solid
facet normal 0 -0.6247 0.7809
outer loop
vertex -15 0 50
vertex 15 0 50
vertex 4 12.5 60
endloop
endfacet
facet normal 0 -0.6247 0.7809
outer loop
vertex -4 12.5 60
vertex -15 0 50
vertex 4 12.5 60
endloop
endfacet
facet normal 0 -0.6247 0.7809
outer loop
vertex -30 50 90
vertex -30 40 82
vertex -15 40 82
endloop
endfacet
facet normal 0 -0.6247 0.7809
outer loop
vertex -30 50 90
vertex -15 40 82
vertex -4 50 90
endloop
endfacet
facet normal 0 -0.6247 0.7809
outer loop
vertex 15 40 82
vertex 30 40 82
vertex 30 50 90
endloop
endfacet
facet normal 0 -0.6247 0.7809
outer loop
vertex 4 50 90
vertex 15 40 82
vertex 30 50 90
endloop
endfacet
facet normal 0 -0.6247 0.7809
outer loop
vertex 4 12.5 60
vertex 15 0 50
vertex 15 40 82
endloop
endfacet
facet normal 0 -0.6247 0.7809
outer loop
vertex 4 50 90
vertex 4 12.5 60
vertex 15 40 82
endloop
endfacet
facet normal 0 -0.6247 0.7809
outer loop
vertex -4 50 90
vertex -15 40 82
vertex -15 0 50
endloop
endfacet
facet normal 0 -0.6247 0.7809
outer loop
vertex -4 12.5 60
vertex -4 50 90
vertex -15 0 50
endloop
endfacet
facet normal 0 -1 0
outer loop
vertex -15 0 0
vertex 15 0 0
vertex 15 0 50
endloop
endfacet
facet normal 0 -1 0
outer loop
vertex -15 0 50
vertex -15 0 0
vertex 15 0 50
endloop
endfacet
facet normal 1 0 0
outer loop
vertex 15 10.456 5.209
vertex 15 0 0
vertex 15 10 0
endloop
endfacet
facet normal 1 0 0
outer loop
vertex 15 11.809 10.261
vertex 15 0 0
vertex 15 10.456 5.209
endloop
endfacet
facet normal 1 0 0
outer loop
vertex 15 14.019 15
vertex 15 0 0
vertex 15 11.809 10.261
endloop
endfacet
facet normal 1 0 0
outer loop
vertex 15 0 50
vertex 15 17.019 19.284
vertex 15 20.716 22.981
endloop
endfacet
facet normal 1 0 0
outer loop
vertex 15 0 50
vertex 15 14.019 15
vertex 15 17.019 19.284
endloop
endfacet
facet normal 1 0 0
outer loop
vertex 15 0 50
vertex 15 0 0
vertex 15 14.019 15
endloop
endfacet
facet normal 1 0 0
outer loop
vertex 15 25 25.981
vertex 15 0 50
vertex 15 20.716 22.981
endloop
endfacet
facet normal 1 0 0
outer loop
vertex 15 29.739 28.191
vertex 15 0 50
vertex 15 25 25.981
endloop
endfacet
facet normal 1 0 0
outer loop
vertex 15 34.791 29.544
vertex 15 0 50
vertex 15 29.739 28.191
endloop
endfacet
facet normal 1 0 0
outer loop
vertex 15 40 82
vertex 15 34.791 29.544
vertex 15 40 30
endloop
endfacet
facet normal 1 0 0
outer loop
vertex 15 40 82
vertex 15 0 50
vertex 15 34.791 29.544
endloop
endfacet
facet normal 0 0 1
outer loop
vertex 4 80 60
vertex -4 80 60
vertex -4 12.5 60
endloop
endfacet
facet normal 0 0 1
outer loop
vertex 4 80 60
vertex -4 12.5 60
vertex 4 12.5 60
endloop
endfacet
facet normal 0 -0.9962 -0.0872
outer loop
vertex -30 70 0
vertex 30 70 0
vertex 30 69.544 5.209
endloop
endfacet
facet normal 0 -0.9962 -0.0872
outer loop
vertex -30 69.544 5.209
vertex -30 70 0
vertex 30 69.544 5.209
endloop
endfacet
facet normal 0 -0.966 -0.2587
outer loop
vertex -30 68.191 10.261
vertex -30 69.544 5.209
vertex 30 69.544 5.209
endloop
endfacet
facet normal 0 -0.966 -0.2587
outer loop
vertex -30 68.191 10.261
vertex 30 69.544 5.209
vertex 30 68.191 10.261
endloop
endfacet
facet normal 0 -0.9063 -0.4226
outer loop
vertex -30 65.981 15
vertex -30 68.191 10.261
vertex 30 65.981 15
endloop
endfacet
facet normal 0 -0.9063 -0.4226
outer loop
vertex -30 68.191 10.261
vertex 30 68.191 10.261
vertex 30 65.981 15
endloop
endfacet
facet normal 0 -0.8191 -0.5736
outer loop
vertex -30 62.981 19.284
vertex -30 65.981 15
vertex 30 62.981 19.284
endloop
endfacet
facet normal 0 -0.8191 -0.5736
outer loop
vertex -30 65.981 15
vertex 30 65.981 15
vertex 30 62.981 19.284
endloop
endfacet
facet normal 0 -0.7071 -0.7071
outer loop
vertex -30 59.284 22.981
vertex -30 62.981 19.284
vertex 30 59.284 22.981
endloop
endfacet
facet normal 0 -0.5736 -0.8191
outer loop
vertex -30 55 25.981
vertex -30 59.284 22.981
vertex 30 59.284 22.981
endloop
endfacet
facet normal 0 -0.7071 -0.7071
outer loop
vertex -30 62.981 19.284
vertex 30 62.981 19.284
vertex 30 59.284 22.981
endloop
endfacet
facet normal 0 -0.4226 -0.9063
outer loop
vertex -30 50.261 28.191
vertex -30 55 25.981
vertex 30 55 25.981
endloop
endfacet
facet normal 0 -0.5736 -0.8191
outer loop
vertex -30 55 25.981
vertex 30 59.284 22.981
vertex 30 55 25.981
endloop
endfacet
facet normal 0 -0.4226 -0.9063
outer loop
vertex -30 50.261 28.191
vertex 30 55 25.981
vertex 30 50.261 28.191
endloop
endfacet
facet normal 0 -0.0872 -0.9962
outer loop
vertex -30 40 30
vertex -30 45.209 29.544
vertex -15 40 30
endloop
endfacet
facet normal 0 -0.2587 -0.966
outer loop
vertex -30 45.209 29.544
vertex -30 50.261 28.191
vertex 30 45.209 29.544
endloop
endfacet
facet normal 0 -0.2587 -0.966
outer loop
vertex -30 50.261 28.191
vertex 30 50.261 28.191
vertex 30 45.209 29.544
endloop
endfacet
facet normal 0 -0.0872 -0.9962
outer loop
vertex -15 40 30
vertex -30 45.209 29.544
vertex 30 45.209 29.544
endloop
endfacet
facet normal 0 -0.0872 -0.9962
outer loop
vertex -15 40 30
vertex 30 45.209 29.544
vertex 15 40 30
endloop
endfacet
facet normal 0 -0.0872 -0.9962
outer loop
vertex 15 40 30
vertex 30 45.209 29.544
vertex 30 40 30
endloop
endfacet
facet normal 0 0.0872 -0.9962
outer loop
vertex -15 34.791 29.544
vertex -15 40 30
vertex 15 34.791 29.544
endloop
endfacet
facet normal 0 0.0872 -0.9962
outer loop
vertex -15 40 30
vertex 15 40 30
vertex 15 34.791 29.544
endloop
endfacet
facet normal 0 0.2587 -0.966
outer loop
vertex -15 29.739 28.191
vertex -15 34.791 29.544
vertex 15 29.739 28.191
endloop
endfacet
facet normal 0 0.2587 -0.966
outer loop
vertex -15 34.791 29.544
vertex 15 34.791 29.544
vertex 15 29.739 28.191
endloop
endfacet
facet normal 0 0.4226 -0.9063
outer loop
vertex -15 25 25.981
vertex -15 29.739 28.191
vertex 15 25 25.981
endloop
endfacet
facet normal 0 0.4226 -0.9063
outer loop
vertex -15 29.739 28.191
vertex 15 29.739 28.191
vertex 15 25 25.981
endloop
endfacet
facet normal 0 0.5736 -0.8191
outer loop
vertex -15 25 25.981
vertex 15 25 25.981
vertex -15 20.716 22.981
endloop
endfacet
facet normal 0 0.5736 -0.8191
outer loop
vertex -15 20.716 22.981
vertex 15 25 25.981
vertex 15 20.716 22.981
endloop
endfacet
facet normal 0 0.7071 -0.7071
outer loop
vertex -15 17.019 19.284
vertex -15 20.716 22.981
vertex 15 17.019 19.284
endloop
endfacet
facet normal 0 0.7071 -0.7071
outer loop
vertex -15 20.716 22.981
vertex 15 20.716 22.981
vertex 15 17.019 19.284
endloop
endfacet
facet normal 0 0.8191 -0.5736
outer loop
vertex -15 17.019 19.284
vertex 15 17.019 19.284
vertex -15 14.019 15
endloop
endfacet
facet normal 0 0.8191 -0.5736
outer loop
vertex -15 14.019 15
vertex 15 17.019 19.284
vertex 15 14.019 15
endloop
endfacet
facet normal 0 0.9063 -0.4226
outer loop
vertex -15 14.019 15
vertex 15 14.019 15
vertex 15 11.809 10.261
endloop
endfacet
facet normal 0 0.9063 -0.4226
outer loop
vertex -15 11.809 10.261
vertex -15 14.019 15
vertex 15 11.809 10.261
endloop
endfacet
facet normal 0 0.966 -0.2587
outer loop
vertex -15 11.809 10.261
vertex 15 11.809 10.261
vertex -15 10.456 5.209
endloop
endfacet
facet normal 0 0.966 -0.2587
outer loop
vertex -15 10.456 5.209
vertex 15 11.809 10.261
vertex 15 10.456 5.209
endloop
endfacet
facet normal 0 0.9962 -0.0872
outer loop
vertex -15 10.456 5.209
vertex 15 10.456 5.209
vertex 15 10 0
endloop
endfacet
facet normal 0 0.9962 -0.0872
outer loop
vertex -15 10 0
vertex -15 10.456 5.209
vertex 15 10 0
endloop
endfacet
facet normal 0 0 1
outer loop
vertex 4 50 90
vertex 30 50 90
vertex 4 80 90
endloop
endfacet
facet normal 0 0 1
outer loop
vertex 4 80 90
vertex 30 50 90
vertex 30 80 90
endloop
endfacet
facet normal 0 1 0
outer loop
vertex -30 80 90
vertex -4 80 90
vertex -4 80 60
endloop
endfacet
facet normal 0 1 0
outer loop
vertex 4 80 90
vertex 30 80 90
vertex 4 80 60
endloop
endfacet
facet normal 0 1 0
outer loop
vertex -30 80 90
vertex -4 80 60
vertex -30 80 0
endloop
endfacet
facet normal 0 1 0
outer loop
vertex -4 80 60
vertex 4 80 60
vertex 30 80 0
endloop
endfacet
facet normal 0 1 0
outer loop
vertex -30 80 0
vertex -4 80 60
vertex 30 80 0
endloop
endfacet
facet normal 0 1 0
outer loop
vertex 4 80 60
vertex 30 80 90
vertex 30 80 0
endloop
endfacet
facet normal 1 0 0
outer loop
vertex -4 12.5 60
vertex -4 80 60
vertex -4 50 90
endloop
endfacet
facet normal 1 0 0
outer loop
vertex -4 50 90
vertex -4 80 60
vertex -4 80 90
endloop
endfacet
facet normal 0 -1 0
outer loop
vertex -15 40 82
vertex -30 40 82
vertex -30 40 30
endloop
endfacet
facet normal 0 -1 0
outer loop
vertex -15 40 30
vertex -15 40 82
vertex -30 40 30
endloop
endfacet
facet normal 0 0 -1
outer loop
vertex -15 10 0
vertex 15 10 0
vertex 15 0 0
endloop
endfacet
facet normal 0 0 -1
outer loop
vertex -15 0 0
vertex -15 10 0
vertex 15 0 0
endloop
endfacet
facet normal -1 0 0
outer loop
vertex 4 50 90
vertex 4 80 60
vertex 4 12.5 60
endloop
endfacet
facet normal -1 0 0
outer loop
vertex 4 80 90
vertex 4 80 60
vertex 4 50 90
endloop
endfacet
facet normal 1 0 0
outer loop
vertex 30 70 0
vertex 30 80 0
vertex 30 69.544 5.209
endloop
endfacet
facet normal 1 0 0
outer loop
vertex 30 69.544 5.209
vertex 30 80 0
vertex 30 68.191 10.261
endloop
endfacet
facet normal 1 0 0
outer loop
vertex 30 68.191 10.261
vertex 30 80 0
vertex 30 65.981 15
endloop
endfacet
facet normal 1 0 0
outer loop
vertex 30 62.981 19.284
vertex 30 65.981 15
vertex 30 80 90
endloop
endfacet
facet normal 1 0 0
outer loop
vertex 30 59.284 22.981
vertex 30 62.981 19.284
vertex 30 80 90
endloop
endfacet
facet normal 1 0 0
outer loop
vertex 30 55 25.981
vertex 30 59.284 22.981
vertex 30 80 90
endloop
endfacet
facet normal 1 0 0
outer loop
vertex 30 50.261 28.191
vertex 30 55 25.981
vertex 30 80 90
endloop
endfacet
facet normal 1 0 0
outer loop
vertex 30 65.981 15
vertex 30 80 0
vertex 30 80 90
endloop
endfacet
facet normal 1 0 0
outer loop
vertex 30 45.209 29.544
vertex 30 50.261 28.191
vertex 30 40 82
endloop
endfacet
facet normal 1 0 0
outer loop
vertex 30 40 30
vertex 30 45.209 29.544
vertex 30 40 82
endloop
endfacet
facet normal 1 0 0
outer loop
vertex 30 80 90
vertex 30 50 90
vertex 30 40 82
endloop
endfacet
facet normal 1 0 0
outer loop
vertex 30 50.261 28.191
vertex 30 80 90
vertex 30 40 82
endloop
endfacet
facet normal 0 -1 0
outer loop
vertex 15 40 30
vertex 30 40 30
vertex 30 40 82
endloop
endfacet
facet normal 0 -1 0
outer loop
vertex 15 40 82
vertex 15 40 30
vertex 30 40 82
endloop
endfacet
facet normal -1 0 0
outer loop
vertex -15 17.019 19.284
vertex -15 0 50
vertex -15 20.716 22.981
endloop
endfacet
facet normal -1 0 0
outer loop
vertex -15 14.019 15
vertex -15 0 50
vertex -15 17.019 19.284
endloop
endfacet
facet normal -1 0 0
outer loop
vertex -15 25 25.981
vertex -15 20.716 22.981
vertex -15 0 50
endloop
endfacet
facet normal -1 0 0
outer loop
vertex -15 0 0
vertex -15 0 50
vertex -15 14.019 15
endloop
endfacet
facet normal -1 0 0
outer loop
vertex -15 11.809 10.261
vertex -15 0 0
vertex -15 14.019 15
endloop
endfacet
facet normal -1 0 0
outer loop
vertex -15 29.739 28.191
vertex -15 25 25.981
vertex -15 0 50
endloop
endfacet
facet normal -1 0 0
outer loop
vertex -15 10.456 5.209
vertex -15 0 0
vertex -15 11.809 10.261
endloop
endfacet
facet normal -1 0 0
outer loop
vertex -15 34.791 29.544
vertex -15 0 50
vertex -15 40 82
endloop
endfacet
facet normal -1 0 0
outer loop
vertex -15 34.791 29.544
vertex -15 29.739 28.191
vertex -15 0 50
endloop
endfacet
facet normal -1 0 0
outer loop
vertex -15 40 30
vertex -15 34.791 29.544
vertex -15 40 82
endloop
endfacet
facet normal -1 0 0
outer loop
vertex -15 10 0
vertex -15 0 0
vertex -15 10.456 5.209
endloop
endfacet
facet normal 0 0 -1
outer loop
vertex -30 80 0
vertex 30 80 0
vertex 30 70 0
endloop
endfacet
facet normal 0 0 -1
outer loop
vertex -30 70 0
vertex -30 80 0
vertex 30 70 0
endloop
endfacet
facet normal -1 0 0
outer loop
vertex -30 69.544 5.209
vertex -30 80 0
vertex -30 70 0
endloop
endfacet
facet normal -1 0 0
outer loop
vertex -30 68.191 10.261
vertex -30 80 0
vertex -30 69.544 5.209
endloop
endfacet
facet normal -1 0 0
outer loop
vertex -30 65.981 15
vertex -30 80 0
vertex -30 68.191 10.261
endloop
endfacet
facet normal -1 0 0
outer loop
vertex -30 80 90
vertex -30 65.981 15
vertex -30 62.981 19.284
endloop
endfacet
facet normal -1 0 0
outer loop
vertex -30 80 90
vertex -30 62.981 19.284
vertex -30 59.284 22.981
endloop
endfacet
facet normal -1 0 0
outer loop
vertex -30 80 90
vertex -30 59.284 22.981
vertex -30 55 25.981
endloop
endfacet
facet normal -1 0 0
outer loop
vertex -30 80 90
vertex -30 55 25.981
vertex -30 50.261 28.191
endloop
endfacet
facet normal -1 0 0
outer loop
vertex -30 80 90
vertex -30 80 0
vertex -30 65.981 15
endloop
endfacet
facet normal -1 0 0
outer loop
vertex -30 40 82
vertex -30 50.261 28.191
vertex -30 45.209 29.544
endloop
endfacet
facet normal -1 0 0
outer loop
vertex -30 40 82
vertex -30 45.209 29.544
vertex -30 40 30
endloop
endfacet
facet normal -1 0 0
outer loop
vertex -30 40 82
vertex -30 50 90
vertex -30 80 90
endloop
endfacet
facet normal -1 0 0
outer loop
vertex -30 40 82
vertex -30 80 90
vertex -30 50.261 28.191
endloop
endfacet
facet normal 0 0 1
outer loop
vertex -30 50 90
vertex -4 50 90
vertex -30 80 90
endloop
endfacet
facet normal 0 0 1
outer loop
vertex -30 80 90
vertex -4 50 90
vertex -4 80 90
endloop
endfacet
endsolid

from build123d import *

# Parameters (mm, degrees)
PAD_DEPTH       = 30
SKETCH002_W     = 40
SKETCH002_H     = 90
POCKET_DEPTH    = 15
SKETCH003_W     = 40
SKETCH003_H     = 90
POCKET001_DEPTH = 15
SKETCH004_W     = 30
SKETCH004_H     = 8
POCKET002_DEPTH = 80.001


with BuildPart() as part:
    # Sketch → Pad (new body, symmetric)
    with BuildSketch(Plane.YZ):
        with BuildLine():
            ThreePointArc((70, 0), (40, 30), (10, 0))
            Line((10, 0), (0, 0))
            Line((0, 0), (0, 50))
            Line((0, 50), (50, 90))
            Line((50, 90), (80, 90))
            Line((80, 90), (80, 0))
            Line((80, 0), (70, 0))
        make_face()
    extrude(amount=PAD_DEPTH, both=True)

    # Sketch002 (on Face9 of Pad) → Pocket (cut)
    with BuildSketch(Plane.YZ.offset(30)):
        with Locations((20, 45)):
            Rectangle(SKETCH002_W, SKETCH002_H)
    extrude(amount=-POCKET_DEPTH, mode=Mode.SUBTRACT)

    # Sketch003 (on Face2 of Pocket) → Pocket001 (cut)
    with BuildSketch(Plane(origin=(-30, 0, 0), x_dir=(0, 1, 0), z_dir=(-1, 0, 0))):
        with Locations((20, -45)):
            Rectangle(SKETCH003_W, SKETCH003_H)
    extrude(amount=-POCKET001_DEPTH, mode=Mode.SUBTRACT)

    # Sketch004 (on Face10 of Pocket001) → Pocket002 (cut, through all)
    with BuildSketch(Plane.ZX.offset(80)):
        with Locations((75, 0)):
            Rectangle(SKETCH004_W, SKETCH004_H)
    extrude(amount=-POCKET002_DEPTH, mode=Mode.SUBTRACT)


solid = part.part
